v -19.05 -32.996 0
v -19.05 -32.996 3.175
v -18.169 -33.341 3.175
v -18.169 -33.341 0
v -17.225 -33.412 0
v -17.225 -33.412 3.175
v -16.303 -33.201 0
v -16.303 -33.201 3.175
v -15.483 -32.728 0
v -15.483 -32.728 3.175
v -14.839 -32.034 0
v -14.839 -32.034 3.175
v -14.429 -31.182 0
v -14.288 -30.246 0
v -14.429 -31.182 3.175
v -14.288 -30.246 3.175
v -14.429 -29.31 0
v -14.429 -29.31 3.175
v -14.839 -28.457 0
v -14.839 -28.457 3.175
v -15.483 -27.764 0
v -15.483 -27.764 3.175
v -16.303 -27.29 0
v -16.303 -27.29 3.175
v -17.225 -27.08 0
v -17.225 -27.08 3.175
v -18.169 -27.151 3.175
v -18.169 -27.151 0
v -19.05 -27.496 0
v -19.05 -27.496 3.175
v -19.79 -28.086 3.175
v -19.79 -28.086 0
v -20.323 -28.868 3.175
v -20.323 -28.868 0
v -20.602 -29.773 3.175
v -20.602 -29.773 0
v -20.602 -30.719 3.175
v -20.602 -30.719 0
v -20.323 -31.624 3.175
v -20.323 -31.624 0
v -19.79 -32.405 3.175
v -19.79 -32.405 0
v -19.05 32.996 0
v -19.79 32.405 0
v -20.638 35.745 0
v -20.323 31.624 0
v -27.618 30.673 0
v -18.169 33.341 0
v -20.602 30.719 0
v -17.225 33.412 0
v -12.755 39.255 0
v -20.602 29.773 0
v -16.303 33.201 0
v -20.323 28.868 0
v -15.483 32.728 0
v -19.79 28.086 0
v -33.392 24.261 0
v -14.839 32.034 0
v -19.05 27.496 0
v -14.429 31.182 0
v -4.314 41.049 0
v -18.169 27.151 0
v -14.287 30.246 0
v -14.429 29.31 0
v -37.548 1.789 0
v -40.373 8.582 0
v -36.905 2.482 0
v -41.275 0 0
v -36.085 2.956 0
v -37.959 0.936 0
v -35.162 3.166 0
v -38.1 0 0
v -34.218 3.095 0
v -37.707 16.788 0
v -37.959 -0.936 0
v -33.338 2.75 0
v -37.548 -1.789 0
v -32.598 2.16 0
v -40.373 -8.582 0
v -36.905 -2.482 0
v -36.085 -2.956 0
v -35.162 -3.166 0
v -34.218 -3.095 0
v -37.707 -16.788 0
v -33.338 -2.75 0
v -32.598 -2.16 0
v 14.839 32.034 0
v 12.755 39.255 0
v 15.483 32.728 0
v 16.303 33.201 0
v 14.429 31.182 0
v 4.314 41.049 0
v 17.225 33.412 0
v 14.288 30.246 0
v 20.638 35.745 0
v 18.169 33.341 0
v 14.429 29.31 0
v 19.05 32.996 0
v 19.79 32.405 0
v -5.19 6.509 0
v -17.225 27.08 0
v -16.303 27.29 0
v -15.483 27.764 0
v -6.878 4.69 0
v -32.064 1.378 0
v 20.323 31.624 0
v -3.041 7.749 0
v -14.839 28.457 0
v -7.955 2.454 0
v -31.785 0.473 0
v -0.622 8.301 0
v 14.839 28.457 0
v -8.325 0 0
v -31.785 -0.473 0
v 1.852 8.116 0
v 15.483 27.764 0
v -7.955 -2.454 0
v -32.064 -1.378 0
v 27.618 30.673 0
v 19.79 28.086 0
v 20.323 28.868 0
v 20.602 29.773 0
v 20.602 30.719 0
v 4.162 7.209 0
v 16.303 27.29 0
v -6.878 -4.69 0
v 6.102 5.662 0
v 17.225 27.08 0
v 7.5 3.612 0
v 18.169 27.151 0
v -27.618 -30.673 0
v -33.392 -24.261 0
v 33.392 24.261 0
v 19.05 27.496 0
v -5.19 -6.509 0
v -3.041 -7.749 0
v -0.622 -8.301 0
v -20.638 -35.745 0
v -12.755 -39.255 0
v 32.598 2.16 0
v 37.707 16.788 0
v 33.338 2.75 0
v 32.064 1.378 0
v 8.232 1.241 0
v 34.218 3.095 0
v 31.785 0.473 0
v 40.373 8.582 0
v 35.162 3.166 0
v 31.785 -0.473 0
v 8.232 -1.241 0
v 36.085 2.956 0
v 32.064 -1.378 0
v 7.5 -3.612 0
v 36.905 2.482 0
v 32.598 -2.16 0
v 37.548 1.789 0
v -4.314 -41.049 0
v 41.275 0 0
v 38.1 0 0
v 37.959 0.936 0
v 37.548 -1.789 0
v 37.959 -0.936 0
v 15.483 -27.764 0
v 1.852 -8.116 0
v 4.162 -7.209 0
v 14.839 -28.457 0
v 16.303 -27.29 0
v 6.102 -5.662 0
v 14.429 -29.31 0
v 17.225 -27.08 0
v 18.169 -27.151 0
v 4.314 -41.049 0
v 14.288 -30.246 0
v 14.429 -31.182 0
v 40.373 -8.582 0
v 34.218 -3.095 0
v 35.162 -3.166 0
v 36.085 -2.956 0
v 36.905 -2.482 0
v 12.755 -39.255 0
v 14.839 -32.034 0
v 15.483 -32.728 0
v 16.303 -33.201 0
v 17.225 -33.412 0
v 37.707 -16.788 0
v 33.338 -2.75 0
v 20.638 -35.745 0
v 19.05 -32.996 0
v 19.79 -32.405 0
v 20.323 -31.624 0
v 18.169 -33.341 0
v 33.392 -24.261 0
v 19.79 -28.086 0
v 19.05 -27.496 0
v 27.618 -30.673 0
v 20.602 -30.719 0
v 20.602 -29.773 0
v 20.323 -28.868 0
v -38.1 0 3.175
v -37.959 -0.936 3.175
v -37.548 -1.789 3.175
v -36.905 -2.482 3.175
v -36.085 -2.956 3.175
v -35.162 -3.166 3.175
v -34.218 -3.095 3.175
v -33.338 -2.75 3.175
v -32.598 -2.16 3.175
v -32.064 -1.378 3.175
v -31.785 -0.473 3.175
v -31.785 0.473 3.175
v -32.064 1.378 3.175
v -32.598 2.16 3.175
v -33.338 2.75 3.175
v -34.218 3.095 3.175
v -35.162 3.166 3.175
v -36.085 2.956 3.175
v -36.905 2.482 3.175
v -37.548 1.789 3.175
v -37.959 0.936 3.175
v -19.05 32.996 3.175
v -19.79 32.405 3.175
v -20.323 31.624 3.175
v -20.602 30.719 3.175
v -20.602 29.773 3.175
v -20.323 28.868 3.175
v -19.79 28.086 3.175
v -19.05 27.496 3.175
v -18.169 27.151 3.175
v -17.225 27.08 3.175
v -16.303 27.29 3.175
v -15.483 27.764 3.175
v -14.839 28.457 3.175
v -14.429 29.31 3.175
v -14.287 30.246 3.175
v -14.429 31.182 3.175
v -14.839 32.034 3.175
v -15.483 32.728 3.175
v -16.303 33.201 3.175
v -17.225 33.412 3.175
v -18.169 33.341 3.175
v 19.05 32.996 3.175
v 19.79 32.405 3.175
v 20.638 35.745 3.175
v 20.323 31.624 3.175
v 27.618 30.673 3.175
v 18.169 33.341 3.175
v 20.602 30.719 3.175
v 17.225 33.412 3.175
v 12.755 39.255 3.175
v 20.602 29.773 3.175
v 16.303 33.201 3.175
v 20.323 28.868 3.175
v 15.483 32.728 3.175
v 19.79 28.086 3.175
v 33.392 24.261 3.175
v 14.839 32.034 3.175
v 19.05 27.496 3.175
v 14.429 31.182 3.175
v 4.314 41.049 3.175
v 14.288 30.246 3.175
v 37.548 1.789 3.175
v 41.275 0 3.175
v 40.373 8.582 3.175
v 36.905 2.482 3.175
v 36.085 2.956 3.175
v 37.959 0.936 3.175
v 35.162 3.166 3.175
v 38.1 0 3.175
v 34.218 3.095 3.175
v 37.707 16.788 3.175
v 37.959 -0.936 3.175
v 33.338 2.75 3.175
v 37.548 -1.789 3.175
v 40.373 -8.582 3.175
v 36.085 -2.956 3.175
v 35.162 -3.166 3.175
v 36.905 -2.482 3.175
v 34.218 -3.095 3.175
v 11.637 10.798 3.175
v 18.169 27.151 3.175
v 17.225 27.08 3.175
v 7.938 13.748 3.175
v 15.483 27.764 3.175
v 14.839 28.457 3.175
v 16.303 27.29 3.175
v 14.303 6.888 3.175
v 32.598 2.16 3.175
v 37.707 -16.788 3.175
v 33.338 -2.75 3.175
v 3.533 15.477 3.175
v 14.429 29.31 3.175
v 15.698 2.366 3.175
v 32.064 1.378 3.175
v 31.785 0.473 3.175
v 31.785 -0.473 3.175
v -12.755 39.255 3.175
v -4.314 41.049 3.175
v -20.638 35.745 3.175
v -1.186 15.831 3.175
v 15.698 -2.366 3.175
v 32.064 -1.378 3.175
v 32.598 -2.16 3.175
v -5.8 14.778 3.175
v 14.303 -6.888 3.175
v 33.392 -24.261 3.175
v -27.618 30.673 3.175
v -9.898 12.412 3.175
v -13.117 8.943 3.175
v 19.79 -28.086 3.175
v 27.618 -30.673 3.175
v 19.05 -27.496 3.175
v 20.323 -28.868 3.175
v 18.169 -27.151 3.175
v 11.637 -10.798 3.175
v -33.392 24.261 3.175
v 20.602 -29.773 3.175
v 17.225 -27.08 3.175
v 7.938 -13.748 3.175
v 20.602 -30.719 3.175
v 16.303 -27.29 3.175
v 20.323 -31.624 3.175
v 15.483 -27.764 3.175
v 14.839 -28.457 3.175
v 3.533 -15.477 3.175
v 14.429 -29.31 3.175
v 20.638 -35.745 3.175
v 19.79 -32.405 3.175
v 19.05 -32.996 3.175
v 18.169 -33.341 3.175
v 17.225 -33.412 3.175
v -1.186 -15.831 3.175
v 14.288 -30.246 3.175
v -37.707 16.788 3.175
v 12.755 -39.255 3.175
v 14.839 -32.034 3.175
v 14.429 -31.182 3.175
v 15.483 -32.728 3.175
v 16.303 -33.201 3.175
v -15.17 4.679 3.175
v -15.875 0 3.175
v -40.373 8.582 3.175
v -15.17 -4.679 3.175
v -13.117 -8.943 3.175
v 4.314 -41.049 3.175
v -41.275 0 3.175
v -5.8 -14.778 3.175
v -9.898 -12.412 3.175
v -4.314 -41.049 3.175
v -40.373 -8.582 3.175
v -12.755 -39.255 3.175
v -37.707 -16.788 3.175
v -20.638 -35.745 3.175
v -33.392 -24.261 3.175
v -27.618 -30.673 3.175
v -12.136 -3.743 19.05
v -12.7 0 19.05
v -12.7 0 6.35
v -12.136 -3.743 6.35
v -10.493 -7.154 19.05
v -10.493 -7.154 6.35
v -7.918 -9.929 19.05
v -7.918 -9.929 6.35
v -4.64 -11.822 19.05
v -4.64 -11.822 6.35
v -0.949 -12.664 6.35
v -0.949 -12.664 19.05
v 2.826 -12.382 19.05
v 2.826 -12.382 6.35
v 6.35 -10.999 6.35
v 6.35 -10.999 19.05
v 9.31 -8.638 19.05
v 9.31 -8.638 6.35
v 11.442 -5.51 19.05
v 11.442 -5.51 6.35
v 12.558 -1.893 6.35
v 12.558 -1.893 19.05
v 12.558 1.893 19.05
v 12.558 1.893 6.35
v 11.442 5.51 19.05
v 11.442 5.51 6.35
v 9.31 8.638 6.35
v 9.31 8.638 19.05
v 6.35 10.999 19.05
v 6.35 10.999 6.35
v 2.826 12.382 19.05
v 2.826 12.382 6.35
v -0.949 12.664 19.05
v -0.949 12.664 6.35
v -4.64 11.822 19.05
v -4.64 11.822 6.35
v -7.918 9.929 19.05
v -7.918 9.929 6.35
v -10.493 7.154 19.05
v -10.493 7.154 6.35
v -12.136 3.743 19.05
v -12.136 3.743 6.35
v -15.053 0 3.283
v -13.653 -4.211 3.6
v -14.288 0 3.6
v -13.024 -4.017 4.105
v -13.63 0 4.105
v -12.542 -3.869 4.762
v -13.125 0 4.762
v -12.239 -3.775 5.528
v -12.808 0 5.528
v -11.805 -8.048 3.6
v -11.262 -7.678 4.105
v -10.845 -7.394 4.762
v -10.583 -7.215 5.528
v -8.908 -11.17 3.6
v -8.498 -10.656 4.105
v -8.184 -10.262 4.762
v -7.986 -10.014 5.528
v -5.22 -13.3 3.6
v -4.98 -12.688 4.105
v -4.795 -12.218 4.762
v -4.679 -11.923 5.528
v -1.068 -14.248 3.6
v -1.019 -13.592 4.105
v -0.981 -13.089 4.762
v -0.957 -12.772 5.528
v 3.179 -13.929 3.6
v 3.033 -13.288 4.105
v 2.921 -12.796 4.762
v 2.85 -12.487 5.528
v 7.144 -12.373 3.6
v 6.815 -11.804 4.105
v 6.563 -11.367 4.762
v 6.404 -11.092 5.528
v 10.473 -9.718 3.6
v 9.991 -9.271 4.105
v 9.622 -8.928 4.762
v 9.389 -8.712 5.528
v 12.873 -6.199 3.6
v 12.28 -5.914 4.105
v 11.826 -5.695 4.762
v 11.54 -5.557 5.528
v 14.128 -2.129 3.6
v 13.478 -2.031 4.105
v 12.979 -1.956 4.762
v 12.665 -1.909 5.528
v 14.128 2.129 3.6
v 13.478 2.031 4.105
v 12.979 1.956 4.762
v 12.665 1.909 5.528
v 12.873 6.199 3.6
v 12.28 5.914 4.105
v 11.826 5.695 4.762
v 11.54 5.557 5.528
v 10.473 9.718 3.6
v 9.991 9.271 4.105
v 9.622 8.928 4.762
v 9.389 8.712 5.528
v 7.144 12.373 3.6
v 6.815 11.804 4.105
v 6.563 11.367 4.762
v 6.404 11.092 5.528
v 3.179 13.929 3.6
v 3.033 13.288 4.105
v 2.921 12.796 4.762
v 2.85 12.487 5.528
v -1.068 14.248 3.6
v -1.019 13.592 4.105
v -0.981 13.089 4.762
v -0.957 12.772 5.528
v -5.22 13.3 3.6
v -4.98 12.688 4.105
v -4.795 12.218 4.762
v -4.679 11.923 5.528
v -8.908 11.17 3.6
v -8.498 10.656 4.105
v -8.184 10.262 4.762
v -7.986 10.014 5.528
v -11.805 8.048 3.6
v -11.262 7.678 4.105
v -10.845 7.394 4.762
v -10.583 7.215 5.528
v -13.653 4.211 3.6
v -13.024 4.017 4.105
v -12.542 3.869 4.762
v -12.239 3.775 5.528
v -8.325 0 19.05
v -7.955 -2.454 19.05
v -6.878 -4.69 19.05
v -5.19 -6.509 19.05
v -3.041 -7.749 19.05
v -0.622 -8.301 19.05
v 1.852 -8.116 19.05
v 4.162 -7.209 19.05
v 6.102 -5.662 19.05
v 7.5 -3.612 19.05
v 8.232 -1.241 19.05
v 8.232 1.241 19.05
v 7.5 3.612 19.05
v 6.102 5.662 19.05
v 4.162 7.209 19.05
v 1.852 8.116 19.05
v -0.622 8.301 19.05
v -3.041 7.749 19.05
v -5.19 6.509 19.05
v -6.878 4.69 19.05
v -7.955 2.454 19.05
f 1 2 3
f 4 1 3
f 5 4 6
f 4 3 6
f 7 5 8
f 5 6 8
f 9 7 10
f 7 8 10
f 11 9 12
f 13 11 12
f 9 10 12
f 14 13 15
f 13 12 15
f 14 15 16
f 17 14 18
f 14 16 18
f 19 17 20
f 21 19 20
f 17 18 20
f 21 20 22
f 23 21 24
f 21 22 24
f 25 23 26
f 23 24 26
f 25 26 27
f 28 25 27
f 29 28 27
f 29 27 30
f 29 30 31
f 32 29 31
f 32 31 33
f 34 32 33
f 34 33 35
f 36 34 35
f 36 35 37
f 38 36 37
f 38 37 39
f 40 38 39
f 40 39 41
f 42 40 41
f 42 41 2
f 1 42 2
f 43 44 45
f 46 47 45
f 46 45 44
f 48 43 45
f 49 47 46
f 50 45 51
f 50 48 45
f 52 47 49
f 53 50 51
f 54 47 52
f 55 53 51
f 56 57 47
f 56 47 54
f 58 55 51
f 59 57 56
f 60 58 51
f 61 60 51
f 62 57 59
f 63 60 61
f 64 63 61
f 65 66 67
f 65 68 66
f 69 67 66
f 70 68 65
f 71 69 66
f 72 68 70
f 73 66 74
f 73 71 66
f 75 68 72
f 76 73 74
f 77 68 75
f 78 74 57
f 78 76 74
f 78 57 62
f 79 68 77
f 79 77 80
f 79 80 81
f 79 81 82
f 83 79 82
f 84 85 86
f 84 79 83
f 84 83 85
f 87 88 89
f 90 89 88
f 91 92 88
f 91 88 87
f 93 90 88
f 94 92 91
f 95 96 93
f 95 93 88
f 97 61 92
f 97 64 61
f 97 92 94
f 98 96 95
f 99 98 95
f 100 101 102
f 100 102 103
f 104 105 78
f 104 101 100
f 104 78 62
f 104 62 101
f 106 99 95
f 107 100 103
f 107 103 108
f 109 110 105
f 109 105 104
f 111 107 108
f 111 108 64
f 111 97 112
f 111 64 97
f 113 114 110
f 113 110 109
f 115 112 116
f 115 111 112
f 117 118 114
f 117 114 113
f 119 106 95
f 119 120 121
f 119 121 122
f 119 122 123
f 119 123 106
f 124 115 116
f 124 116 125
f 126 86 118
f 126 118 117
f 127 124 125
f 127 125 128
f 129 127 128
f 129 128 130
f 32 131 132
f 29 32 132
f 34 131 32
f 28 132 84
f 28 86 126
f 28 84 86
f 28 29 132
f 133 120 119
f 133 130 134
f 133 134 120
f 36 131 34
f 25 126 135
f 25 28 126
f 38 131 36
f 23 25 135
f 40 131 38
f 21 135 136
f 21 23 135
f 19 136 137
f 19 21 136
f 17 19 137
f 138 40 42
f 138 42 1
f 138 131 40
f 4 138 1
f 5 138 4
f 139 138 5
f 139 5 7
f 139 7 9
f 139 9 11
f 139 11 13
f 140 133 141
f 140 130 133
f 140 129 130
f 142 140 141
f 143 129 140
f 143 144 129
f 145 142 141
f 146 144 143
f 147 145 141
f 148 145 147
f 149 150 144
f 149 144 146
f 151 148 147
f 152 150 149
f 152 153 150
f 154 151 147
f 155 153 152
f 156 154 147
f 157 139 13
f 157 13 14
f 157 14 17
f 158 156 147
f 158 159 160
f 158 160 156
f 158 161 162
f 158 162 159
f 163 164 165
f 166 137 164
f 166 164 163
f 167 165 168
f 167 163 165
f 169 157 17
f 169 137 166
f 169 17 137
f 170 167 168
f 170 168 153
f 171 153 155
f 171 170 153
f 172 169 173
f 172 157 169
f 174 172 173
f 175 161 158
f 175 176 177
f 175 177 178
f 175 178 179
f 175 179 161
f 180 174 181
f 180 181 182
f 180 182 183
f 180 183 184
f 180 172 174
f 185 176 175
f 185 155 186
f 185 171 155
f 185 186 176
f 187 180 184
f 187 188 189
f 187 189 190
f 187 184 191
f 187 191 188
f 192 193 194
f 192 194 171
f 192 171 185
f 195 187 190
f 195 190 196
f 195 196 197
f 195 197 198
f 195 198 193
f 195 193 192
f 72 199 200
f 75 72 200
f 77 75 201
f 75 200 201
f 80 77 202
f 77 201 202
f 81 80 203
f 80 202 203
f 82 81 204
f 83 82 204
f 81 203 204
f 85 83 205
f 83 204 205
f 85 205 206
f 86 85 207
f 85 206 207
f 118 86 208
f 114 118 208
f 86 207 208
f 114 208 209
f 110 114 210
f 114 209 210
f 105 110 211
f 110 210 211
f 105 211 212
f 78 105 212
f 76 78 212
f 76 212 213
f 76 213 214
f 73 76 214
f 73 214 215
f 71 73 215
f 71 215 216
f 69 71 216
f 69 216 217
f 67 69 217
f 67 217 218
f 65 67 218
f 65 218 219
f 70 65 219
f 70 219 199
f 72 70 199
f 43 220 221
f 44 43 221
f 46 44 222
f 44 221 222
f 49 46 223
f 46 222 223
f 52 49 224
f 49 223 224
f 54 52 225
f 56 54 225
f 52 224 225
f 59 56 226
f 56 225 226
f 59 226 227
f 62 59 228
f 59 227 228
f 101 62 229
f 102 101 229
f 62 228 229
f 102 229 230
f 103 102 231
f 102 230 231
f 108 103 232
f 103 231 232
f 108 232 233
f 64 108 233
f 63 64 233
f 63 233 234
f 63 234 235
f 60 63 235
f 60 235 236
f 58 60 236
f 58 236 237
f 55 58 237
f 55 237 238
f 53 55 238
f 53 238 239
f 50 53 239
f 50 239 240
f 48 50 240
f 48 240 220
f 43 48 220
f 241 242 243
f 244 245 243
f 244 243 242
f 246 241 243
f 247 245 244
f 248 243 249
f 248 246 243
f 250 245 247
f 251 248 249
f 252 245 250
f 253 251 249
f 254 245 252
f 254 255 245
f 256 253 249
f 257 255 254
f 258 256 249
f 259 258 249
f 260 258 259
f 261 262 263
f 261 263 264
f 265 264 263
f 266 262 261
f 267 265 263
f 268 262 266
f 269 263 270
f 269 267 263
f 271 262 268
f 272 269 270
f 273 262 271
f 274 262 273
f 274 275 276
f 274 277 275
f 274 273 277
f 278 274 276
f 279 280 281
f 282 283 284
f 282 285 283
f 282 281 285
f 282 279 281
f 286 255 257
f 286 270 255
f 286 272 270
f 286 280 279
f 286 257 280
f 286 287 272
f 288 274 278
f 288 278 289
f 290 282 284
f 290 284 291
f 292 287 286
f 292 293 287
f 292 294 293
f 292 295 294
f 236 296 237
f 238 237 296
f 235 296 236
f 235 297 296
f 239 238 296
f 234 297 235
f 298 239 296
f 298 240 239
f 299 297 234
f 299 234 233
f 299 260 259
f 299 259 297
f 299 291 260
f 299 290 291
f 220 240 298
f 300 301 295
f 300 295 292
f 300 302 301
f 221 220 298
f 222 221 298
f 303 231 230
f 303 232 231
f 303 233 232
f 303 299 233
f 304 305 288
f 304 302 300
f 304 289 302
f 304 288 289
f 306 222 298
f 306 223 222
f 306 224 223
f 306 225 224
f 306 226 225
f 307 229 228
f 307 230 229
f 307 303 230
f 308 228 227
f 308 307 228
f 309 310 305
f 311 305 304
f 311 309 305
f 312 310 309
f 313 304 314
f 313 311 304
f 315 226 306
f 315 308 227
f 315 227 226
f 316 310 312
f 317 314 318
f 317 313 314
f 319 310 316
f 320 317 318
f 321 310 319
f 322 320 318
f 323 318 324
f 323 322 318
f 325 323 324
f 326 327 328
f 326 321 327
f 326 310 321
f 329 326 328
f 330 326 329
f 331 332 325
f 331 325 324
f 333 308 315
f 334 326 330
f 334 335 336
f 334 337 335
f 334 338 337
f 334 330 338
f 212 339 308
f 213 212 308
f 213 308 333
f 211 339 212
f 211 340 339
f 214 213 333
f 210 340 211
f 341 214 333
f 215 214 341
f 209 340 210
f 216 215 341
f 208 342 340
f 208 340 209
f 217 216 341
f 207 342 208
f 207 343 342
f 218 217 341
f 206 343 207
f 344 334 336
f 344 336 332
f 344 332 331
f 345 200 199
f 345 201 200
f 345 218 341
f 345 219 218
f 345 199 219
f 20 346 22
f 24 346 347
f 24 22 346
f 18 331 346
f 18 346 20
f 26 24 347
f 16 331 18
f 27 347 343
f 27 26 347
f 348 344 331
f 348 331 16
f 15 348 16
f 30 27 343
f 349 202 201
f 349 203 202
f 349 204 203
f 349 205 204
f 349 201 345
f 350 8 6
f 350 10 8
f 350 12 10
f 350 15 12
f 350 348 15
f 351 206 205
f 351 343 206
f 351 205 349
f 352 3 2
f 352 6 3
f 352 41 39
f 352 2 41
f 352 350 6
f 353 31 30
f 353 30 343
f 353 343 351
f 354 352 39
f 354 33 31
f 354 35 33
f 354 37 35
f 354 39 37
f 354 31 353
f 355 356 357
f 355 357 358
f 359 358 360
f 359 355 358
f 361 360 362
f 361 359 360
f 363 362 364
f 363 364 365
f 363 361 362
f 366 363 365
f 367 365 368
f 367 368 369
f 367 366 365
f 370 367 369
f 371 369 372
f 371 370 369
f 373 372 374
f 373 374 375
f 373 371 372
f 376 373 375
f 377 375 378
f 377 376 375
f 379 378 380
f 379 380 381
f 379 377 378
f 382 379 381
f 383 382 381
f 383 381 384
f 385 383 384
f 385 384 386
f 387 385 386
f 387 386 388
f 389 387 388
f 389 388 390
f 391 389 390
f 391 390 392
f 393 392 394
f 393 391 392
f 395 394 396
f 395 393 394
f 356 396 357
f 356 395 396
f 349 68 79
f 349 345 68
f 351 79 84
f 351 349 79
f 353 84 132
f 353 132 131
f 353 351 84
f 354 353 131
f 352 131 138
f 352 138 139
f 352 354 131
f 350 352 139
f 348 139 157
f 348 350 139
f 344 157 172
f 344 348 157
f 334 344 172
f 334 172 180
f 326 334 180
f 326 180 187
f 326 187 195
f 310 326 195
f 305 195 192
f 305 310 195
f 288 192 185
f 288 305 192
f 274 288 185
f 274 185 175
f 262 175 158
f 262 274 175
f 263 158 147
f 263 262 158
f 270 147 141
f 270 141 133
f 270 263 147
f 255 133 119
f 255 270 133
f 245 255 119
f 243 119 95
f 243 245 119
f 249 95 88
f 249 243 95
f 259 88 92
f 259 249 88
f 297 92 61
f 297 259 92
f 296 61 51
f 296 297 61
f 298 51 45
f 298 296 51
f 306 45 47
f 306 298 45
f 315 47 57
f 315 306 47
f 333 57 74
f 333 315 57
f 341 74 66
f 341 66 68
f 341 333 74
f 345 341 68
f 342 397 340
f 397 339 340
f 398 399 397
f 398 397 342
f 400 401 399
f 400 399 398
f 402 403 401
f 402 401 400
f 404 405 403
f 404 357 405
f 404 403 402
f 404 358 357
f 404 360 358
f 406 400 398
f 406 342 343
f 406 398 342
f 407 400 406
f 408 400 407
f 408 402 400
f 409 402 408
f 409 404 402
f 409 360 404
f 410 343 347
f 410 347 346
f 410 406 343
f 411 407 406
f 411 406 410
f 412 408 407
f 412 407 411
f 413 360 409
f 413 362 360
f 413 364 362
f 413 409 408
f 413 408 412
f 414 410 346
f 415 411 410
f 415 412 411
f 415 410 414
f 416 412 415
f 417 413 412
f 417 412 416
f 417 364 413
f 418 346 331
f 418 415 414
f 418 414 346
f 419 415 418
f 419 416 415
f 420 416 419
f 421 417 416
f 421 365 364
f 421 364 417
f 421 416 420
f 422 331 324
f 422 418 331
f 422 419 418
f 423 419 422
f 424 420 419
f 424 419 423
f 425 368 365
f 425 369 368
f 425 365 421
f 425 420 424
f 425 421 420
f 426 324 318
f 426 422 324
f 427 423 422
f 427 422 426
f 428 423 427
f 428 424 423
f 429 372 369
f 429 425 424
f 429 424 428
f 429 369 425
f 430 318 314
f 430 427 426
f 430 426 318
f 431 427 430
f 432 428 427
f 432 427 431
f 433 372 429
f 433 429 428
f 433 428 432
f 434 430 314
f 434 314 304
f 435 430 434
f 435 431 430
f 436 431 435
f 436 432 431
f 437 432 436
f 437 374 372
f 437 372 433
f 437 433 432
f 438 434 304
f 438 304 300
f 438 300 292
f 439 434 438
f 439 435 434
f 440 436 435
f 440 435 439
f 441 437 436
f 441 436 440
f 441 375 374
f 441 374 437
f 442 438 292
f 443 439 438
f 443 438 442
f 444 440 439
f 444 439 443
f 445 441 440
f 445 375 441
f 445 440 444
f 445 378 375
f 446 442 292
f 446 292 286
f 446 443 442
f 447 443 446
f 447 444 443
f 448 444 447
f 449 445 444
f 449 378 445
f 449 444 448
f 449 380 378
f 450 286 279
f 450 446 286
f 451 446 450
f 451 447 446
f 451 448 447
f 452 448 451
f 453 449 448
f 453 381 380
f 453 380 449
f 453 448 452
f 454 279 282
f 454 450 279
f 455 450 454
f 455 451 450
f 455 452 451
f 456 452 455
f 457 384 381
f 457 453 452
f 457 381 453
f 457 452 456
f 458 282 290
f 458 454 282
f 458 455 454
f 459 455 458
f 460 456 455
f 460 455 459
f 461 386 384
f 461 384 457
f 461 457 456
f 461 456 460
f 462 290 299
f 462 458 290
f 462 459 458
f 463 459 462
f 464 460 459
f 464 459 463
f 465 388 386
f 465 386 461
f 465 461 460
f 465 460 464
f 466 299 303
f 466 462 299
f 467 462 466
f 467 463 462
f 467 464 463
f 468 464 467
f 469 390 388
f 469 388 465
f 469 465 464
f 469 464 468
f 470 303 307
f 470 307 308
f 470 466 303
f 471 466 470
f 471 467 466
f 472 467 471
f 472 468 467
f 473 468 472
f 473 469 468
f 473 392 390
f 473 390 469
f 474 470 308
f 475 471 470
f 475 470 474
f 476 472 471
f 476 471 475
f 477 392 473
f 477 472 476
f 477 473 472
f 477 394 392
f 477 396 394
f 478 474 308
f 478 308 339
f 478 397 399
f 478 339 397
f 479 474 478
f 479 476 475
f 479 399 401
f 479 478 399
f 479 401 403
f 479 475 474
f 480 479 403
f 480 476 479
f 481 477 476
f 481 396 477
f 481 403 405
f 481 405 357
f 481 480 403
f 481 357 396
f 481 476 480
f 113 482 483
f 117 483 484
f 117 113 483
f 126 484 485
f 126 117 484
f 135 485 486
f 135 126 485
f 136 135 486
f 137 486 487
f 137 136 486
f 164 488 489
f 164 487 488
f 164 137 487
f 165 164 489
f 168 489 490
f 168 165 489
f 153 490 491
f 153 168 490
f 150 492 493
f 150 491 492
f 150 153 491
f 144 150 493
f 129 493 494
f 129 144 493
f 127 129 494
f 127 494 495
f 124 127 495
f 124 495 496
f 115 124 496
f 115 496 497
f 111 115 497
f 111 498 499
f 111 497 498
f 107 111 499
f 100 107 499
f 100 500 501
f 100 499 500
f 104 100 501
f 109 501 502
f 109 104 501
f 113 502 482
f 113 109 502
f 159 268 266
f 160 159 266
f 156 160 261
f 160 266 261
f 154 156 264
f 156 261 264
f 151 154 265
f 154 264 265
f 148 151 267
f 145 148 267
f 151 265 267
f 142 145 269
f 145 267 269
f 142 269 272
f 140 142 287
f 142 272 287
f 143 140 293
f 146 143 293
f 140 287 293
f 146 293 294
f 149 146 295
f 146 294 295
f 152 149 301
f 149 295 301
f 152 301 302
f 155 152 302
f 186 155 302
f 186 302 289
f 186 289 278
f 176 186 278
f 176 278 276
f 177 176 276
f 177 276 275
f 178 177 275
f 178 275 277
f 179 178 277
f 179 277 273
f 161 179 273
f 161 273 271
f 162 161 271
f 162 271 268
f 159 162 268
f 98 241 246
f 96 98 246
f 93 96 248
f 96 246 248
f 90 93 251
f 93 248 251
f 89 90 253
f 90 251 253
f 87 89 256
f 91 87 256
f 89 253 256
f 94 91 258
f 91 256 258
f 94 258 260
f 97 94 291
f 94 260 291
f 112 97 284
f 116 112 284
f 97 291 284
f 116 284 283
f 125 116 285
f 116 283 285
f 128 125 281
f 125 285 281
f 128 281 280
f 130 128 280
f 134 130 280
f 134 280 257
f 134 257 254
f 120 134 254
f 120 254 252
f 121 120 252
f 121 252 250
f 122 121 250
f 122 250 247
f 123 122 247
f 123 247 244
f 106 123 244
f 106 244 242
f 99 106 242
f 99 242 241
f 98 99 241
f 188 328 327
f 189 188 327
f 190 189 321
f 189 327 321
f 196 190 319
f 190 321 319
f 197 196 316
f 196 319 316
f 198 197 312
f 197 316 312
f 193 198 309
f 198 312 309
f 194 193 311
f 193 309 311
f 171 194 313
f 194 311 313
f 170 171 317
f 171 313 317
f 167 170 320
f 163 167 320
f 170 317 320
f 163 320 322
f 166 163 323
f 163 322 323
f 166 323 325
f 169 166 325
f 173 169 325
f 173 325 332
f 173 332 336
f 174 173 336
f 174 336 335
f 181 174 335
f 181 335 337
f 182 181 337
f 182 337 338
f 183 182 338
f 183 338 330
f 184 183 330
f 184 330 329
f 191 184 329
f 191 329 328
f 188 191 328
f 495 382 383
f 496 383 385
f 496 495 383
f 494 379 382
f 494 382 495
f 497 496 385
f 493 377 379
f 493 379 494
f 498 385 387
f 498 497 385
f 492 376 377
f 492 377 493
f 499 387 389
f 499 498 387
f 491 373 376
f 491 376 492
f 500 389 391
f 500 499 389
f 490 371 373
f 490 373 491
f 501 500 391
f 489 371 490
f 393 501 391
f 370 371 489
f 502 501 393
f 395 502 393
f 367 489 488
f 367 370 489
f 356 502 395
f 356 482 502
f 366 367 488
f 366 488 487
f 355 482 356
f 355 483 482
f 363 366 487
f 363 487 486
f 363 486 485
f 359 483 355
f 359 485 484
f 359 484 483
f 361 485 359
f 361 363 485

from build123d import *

# Parameters (mm, degrees)
SKETCH2_R          = 8.324772978
CUT_EXTRUDE5_DEPTH = 62.401577748
SKETCH3_R          = 3.175
CUT_EXTRUDE6_DEPTH = 61.491874454
CIRPATTERN2_COUNT  = 6
FILLET1_R          = 3.175


with BuildPart() as part:
    # Sketch1 → Revolve1 (revolve)
    with BuildSketch(Plane(origin=(0, 0, 0), x_dir=(0, 0, -1), z_dir=(1, 0, 0)), mode=Mode.PRIVATE) as revolve1_sk:
        Polygon((0, 0), (0, 41.275), (-3.175, 41.275), (-3.175, 12.7), (-19.05, 12.7), (-19.05, 0), align=None)
    revolve(revolve1_sk.sketch.rotate(Axis((0, 0, 0), (0, 0, 1)), 90), axis=Axis((0, 0, 0), (0, 0, 1)))

    # Sketch2 → Cut-Extrude5 (cut, through all)
    with BuildSketch(Plane.XY):
        with Locations(Location((0, 0, 0), (0, 0, 180))):
            Circle(SKETCH2_R)
    extrude(amount=CUT_EXTRUDE5_DEPTH, mode=Mode.SUBTRACT)

    # Sketch3 → Cut-Extrude6 (cut, through all)
    with BuildSketch(Plane.XY.offset(3.175)):
        with Locations((34.925, 0)):
            Circle(SKETCH3_R)
    cut_extrude6 = extrude(amount=-CUT_EXTRUDE6_DEPTH, mode=Mode.SUBTRACT)

    # CirPattern2: Cut-Extrude6 ×6 about axis
    cirpattern2_axis = Axis((0, 0, 0), (0, 0, 1))
    for i in range(1, CIRPATTERN2_COUNT):
        add(cut_extrude6.rotate(cirpattern2_axis, i * 360 / CIRPATTERN2_COUNT), mode=Mode.SUBTRACT)

    # Fillet1
    fillet1_edges = [part.edges().sort_by_distance(p)[0] for p in [
        (12.7, 0, 3.175),
    ]]
    fillet(fillet1_edges, radius=FILLET1_R)


solid = part.part
